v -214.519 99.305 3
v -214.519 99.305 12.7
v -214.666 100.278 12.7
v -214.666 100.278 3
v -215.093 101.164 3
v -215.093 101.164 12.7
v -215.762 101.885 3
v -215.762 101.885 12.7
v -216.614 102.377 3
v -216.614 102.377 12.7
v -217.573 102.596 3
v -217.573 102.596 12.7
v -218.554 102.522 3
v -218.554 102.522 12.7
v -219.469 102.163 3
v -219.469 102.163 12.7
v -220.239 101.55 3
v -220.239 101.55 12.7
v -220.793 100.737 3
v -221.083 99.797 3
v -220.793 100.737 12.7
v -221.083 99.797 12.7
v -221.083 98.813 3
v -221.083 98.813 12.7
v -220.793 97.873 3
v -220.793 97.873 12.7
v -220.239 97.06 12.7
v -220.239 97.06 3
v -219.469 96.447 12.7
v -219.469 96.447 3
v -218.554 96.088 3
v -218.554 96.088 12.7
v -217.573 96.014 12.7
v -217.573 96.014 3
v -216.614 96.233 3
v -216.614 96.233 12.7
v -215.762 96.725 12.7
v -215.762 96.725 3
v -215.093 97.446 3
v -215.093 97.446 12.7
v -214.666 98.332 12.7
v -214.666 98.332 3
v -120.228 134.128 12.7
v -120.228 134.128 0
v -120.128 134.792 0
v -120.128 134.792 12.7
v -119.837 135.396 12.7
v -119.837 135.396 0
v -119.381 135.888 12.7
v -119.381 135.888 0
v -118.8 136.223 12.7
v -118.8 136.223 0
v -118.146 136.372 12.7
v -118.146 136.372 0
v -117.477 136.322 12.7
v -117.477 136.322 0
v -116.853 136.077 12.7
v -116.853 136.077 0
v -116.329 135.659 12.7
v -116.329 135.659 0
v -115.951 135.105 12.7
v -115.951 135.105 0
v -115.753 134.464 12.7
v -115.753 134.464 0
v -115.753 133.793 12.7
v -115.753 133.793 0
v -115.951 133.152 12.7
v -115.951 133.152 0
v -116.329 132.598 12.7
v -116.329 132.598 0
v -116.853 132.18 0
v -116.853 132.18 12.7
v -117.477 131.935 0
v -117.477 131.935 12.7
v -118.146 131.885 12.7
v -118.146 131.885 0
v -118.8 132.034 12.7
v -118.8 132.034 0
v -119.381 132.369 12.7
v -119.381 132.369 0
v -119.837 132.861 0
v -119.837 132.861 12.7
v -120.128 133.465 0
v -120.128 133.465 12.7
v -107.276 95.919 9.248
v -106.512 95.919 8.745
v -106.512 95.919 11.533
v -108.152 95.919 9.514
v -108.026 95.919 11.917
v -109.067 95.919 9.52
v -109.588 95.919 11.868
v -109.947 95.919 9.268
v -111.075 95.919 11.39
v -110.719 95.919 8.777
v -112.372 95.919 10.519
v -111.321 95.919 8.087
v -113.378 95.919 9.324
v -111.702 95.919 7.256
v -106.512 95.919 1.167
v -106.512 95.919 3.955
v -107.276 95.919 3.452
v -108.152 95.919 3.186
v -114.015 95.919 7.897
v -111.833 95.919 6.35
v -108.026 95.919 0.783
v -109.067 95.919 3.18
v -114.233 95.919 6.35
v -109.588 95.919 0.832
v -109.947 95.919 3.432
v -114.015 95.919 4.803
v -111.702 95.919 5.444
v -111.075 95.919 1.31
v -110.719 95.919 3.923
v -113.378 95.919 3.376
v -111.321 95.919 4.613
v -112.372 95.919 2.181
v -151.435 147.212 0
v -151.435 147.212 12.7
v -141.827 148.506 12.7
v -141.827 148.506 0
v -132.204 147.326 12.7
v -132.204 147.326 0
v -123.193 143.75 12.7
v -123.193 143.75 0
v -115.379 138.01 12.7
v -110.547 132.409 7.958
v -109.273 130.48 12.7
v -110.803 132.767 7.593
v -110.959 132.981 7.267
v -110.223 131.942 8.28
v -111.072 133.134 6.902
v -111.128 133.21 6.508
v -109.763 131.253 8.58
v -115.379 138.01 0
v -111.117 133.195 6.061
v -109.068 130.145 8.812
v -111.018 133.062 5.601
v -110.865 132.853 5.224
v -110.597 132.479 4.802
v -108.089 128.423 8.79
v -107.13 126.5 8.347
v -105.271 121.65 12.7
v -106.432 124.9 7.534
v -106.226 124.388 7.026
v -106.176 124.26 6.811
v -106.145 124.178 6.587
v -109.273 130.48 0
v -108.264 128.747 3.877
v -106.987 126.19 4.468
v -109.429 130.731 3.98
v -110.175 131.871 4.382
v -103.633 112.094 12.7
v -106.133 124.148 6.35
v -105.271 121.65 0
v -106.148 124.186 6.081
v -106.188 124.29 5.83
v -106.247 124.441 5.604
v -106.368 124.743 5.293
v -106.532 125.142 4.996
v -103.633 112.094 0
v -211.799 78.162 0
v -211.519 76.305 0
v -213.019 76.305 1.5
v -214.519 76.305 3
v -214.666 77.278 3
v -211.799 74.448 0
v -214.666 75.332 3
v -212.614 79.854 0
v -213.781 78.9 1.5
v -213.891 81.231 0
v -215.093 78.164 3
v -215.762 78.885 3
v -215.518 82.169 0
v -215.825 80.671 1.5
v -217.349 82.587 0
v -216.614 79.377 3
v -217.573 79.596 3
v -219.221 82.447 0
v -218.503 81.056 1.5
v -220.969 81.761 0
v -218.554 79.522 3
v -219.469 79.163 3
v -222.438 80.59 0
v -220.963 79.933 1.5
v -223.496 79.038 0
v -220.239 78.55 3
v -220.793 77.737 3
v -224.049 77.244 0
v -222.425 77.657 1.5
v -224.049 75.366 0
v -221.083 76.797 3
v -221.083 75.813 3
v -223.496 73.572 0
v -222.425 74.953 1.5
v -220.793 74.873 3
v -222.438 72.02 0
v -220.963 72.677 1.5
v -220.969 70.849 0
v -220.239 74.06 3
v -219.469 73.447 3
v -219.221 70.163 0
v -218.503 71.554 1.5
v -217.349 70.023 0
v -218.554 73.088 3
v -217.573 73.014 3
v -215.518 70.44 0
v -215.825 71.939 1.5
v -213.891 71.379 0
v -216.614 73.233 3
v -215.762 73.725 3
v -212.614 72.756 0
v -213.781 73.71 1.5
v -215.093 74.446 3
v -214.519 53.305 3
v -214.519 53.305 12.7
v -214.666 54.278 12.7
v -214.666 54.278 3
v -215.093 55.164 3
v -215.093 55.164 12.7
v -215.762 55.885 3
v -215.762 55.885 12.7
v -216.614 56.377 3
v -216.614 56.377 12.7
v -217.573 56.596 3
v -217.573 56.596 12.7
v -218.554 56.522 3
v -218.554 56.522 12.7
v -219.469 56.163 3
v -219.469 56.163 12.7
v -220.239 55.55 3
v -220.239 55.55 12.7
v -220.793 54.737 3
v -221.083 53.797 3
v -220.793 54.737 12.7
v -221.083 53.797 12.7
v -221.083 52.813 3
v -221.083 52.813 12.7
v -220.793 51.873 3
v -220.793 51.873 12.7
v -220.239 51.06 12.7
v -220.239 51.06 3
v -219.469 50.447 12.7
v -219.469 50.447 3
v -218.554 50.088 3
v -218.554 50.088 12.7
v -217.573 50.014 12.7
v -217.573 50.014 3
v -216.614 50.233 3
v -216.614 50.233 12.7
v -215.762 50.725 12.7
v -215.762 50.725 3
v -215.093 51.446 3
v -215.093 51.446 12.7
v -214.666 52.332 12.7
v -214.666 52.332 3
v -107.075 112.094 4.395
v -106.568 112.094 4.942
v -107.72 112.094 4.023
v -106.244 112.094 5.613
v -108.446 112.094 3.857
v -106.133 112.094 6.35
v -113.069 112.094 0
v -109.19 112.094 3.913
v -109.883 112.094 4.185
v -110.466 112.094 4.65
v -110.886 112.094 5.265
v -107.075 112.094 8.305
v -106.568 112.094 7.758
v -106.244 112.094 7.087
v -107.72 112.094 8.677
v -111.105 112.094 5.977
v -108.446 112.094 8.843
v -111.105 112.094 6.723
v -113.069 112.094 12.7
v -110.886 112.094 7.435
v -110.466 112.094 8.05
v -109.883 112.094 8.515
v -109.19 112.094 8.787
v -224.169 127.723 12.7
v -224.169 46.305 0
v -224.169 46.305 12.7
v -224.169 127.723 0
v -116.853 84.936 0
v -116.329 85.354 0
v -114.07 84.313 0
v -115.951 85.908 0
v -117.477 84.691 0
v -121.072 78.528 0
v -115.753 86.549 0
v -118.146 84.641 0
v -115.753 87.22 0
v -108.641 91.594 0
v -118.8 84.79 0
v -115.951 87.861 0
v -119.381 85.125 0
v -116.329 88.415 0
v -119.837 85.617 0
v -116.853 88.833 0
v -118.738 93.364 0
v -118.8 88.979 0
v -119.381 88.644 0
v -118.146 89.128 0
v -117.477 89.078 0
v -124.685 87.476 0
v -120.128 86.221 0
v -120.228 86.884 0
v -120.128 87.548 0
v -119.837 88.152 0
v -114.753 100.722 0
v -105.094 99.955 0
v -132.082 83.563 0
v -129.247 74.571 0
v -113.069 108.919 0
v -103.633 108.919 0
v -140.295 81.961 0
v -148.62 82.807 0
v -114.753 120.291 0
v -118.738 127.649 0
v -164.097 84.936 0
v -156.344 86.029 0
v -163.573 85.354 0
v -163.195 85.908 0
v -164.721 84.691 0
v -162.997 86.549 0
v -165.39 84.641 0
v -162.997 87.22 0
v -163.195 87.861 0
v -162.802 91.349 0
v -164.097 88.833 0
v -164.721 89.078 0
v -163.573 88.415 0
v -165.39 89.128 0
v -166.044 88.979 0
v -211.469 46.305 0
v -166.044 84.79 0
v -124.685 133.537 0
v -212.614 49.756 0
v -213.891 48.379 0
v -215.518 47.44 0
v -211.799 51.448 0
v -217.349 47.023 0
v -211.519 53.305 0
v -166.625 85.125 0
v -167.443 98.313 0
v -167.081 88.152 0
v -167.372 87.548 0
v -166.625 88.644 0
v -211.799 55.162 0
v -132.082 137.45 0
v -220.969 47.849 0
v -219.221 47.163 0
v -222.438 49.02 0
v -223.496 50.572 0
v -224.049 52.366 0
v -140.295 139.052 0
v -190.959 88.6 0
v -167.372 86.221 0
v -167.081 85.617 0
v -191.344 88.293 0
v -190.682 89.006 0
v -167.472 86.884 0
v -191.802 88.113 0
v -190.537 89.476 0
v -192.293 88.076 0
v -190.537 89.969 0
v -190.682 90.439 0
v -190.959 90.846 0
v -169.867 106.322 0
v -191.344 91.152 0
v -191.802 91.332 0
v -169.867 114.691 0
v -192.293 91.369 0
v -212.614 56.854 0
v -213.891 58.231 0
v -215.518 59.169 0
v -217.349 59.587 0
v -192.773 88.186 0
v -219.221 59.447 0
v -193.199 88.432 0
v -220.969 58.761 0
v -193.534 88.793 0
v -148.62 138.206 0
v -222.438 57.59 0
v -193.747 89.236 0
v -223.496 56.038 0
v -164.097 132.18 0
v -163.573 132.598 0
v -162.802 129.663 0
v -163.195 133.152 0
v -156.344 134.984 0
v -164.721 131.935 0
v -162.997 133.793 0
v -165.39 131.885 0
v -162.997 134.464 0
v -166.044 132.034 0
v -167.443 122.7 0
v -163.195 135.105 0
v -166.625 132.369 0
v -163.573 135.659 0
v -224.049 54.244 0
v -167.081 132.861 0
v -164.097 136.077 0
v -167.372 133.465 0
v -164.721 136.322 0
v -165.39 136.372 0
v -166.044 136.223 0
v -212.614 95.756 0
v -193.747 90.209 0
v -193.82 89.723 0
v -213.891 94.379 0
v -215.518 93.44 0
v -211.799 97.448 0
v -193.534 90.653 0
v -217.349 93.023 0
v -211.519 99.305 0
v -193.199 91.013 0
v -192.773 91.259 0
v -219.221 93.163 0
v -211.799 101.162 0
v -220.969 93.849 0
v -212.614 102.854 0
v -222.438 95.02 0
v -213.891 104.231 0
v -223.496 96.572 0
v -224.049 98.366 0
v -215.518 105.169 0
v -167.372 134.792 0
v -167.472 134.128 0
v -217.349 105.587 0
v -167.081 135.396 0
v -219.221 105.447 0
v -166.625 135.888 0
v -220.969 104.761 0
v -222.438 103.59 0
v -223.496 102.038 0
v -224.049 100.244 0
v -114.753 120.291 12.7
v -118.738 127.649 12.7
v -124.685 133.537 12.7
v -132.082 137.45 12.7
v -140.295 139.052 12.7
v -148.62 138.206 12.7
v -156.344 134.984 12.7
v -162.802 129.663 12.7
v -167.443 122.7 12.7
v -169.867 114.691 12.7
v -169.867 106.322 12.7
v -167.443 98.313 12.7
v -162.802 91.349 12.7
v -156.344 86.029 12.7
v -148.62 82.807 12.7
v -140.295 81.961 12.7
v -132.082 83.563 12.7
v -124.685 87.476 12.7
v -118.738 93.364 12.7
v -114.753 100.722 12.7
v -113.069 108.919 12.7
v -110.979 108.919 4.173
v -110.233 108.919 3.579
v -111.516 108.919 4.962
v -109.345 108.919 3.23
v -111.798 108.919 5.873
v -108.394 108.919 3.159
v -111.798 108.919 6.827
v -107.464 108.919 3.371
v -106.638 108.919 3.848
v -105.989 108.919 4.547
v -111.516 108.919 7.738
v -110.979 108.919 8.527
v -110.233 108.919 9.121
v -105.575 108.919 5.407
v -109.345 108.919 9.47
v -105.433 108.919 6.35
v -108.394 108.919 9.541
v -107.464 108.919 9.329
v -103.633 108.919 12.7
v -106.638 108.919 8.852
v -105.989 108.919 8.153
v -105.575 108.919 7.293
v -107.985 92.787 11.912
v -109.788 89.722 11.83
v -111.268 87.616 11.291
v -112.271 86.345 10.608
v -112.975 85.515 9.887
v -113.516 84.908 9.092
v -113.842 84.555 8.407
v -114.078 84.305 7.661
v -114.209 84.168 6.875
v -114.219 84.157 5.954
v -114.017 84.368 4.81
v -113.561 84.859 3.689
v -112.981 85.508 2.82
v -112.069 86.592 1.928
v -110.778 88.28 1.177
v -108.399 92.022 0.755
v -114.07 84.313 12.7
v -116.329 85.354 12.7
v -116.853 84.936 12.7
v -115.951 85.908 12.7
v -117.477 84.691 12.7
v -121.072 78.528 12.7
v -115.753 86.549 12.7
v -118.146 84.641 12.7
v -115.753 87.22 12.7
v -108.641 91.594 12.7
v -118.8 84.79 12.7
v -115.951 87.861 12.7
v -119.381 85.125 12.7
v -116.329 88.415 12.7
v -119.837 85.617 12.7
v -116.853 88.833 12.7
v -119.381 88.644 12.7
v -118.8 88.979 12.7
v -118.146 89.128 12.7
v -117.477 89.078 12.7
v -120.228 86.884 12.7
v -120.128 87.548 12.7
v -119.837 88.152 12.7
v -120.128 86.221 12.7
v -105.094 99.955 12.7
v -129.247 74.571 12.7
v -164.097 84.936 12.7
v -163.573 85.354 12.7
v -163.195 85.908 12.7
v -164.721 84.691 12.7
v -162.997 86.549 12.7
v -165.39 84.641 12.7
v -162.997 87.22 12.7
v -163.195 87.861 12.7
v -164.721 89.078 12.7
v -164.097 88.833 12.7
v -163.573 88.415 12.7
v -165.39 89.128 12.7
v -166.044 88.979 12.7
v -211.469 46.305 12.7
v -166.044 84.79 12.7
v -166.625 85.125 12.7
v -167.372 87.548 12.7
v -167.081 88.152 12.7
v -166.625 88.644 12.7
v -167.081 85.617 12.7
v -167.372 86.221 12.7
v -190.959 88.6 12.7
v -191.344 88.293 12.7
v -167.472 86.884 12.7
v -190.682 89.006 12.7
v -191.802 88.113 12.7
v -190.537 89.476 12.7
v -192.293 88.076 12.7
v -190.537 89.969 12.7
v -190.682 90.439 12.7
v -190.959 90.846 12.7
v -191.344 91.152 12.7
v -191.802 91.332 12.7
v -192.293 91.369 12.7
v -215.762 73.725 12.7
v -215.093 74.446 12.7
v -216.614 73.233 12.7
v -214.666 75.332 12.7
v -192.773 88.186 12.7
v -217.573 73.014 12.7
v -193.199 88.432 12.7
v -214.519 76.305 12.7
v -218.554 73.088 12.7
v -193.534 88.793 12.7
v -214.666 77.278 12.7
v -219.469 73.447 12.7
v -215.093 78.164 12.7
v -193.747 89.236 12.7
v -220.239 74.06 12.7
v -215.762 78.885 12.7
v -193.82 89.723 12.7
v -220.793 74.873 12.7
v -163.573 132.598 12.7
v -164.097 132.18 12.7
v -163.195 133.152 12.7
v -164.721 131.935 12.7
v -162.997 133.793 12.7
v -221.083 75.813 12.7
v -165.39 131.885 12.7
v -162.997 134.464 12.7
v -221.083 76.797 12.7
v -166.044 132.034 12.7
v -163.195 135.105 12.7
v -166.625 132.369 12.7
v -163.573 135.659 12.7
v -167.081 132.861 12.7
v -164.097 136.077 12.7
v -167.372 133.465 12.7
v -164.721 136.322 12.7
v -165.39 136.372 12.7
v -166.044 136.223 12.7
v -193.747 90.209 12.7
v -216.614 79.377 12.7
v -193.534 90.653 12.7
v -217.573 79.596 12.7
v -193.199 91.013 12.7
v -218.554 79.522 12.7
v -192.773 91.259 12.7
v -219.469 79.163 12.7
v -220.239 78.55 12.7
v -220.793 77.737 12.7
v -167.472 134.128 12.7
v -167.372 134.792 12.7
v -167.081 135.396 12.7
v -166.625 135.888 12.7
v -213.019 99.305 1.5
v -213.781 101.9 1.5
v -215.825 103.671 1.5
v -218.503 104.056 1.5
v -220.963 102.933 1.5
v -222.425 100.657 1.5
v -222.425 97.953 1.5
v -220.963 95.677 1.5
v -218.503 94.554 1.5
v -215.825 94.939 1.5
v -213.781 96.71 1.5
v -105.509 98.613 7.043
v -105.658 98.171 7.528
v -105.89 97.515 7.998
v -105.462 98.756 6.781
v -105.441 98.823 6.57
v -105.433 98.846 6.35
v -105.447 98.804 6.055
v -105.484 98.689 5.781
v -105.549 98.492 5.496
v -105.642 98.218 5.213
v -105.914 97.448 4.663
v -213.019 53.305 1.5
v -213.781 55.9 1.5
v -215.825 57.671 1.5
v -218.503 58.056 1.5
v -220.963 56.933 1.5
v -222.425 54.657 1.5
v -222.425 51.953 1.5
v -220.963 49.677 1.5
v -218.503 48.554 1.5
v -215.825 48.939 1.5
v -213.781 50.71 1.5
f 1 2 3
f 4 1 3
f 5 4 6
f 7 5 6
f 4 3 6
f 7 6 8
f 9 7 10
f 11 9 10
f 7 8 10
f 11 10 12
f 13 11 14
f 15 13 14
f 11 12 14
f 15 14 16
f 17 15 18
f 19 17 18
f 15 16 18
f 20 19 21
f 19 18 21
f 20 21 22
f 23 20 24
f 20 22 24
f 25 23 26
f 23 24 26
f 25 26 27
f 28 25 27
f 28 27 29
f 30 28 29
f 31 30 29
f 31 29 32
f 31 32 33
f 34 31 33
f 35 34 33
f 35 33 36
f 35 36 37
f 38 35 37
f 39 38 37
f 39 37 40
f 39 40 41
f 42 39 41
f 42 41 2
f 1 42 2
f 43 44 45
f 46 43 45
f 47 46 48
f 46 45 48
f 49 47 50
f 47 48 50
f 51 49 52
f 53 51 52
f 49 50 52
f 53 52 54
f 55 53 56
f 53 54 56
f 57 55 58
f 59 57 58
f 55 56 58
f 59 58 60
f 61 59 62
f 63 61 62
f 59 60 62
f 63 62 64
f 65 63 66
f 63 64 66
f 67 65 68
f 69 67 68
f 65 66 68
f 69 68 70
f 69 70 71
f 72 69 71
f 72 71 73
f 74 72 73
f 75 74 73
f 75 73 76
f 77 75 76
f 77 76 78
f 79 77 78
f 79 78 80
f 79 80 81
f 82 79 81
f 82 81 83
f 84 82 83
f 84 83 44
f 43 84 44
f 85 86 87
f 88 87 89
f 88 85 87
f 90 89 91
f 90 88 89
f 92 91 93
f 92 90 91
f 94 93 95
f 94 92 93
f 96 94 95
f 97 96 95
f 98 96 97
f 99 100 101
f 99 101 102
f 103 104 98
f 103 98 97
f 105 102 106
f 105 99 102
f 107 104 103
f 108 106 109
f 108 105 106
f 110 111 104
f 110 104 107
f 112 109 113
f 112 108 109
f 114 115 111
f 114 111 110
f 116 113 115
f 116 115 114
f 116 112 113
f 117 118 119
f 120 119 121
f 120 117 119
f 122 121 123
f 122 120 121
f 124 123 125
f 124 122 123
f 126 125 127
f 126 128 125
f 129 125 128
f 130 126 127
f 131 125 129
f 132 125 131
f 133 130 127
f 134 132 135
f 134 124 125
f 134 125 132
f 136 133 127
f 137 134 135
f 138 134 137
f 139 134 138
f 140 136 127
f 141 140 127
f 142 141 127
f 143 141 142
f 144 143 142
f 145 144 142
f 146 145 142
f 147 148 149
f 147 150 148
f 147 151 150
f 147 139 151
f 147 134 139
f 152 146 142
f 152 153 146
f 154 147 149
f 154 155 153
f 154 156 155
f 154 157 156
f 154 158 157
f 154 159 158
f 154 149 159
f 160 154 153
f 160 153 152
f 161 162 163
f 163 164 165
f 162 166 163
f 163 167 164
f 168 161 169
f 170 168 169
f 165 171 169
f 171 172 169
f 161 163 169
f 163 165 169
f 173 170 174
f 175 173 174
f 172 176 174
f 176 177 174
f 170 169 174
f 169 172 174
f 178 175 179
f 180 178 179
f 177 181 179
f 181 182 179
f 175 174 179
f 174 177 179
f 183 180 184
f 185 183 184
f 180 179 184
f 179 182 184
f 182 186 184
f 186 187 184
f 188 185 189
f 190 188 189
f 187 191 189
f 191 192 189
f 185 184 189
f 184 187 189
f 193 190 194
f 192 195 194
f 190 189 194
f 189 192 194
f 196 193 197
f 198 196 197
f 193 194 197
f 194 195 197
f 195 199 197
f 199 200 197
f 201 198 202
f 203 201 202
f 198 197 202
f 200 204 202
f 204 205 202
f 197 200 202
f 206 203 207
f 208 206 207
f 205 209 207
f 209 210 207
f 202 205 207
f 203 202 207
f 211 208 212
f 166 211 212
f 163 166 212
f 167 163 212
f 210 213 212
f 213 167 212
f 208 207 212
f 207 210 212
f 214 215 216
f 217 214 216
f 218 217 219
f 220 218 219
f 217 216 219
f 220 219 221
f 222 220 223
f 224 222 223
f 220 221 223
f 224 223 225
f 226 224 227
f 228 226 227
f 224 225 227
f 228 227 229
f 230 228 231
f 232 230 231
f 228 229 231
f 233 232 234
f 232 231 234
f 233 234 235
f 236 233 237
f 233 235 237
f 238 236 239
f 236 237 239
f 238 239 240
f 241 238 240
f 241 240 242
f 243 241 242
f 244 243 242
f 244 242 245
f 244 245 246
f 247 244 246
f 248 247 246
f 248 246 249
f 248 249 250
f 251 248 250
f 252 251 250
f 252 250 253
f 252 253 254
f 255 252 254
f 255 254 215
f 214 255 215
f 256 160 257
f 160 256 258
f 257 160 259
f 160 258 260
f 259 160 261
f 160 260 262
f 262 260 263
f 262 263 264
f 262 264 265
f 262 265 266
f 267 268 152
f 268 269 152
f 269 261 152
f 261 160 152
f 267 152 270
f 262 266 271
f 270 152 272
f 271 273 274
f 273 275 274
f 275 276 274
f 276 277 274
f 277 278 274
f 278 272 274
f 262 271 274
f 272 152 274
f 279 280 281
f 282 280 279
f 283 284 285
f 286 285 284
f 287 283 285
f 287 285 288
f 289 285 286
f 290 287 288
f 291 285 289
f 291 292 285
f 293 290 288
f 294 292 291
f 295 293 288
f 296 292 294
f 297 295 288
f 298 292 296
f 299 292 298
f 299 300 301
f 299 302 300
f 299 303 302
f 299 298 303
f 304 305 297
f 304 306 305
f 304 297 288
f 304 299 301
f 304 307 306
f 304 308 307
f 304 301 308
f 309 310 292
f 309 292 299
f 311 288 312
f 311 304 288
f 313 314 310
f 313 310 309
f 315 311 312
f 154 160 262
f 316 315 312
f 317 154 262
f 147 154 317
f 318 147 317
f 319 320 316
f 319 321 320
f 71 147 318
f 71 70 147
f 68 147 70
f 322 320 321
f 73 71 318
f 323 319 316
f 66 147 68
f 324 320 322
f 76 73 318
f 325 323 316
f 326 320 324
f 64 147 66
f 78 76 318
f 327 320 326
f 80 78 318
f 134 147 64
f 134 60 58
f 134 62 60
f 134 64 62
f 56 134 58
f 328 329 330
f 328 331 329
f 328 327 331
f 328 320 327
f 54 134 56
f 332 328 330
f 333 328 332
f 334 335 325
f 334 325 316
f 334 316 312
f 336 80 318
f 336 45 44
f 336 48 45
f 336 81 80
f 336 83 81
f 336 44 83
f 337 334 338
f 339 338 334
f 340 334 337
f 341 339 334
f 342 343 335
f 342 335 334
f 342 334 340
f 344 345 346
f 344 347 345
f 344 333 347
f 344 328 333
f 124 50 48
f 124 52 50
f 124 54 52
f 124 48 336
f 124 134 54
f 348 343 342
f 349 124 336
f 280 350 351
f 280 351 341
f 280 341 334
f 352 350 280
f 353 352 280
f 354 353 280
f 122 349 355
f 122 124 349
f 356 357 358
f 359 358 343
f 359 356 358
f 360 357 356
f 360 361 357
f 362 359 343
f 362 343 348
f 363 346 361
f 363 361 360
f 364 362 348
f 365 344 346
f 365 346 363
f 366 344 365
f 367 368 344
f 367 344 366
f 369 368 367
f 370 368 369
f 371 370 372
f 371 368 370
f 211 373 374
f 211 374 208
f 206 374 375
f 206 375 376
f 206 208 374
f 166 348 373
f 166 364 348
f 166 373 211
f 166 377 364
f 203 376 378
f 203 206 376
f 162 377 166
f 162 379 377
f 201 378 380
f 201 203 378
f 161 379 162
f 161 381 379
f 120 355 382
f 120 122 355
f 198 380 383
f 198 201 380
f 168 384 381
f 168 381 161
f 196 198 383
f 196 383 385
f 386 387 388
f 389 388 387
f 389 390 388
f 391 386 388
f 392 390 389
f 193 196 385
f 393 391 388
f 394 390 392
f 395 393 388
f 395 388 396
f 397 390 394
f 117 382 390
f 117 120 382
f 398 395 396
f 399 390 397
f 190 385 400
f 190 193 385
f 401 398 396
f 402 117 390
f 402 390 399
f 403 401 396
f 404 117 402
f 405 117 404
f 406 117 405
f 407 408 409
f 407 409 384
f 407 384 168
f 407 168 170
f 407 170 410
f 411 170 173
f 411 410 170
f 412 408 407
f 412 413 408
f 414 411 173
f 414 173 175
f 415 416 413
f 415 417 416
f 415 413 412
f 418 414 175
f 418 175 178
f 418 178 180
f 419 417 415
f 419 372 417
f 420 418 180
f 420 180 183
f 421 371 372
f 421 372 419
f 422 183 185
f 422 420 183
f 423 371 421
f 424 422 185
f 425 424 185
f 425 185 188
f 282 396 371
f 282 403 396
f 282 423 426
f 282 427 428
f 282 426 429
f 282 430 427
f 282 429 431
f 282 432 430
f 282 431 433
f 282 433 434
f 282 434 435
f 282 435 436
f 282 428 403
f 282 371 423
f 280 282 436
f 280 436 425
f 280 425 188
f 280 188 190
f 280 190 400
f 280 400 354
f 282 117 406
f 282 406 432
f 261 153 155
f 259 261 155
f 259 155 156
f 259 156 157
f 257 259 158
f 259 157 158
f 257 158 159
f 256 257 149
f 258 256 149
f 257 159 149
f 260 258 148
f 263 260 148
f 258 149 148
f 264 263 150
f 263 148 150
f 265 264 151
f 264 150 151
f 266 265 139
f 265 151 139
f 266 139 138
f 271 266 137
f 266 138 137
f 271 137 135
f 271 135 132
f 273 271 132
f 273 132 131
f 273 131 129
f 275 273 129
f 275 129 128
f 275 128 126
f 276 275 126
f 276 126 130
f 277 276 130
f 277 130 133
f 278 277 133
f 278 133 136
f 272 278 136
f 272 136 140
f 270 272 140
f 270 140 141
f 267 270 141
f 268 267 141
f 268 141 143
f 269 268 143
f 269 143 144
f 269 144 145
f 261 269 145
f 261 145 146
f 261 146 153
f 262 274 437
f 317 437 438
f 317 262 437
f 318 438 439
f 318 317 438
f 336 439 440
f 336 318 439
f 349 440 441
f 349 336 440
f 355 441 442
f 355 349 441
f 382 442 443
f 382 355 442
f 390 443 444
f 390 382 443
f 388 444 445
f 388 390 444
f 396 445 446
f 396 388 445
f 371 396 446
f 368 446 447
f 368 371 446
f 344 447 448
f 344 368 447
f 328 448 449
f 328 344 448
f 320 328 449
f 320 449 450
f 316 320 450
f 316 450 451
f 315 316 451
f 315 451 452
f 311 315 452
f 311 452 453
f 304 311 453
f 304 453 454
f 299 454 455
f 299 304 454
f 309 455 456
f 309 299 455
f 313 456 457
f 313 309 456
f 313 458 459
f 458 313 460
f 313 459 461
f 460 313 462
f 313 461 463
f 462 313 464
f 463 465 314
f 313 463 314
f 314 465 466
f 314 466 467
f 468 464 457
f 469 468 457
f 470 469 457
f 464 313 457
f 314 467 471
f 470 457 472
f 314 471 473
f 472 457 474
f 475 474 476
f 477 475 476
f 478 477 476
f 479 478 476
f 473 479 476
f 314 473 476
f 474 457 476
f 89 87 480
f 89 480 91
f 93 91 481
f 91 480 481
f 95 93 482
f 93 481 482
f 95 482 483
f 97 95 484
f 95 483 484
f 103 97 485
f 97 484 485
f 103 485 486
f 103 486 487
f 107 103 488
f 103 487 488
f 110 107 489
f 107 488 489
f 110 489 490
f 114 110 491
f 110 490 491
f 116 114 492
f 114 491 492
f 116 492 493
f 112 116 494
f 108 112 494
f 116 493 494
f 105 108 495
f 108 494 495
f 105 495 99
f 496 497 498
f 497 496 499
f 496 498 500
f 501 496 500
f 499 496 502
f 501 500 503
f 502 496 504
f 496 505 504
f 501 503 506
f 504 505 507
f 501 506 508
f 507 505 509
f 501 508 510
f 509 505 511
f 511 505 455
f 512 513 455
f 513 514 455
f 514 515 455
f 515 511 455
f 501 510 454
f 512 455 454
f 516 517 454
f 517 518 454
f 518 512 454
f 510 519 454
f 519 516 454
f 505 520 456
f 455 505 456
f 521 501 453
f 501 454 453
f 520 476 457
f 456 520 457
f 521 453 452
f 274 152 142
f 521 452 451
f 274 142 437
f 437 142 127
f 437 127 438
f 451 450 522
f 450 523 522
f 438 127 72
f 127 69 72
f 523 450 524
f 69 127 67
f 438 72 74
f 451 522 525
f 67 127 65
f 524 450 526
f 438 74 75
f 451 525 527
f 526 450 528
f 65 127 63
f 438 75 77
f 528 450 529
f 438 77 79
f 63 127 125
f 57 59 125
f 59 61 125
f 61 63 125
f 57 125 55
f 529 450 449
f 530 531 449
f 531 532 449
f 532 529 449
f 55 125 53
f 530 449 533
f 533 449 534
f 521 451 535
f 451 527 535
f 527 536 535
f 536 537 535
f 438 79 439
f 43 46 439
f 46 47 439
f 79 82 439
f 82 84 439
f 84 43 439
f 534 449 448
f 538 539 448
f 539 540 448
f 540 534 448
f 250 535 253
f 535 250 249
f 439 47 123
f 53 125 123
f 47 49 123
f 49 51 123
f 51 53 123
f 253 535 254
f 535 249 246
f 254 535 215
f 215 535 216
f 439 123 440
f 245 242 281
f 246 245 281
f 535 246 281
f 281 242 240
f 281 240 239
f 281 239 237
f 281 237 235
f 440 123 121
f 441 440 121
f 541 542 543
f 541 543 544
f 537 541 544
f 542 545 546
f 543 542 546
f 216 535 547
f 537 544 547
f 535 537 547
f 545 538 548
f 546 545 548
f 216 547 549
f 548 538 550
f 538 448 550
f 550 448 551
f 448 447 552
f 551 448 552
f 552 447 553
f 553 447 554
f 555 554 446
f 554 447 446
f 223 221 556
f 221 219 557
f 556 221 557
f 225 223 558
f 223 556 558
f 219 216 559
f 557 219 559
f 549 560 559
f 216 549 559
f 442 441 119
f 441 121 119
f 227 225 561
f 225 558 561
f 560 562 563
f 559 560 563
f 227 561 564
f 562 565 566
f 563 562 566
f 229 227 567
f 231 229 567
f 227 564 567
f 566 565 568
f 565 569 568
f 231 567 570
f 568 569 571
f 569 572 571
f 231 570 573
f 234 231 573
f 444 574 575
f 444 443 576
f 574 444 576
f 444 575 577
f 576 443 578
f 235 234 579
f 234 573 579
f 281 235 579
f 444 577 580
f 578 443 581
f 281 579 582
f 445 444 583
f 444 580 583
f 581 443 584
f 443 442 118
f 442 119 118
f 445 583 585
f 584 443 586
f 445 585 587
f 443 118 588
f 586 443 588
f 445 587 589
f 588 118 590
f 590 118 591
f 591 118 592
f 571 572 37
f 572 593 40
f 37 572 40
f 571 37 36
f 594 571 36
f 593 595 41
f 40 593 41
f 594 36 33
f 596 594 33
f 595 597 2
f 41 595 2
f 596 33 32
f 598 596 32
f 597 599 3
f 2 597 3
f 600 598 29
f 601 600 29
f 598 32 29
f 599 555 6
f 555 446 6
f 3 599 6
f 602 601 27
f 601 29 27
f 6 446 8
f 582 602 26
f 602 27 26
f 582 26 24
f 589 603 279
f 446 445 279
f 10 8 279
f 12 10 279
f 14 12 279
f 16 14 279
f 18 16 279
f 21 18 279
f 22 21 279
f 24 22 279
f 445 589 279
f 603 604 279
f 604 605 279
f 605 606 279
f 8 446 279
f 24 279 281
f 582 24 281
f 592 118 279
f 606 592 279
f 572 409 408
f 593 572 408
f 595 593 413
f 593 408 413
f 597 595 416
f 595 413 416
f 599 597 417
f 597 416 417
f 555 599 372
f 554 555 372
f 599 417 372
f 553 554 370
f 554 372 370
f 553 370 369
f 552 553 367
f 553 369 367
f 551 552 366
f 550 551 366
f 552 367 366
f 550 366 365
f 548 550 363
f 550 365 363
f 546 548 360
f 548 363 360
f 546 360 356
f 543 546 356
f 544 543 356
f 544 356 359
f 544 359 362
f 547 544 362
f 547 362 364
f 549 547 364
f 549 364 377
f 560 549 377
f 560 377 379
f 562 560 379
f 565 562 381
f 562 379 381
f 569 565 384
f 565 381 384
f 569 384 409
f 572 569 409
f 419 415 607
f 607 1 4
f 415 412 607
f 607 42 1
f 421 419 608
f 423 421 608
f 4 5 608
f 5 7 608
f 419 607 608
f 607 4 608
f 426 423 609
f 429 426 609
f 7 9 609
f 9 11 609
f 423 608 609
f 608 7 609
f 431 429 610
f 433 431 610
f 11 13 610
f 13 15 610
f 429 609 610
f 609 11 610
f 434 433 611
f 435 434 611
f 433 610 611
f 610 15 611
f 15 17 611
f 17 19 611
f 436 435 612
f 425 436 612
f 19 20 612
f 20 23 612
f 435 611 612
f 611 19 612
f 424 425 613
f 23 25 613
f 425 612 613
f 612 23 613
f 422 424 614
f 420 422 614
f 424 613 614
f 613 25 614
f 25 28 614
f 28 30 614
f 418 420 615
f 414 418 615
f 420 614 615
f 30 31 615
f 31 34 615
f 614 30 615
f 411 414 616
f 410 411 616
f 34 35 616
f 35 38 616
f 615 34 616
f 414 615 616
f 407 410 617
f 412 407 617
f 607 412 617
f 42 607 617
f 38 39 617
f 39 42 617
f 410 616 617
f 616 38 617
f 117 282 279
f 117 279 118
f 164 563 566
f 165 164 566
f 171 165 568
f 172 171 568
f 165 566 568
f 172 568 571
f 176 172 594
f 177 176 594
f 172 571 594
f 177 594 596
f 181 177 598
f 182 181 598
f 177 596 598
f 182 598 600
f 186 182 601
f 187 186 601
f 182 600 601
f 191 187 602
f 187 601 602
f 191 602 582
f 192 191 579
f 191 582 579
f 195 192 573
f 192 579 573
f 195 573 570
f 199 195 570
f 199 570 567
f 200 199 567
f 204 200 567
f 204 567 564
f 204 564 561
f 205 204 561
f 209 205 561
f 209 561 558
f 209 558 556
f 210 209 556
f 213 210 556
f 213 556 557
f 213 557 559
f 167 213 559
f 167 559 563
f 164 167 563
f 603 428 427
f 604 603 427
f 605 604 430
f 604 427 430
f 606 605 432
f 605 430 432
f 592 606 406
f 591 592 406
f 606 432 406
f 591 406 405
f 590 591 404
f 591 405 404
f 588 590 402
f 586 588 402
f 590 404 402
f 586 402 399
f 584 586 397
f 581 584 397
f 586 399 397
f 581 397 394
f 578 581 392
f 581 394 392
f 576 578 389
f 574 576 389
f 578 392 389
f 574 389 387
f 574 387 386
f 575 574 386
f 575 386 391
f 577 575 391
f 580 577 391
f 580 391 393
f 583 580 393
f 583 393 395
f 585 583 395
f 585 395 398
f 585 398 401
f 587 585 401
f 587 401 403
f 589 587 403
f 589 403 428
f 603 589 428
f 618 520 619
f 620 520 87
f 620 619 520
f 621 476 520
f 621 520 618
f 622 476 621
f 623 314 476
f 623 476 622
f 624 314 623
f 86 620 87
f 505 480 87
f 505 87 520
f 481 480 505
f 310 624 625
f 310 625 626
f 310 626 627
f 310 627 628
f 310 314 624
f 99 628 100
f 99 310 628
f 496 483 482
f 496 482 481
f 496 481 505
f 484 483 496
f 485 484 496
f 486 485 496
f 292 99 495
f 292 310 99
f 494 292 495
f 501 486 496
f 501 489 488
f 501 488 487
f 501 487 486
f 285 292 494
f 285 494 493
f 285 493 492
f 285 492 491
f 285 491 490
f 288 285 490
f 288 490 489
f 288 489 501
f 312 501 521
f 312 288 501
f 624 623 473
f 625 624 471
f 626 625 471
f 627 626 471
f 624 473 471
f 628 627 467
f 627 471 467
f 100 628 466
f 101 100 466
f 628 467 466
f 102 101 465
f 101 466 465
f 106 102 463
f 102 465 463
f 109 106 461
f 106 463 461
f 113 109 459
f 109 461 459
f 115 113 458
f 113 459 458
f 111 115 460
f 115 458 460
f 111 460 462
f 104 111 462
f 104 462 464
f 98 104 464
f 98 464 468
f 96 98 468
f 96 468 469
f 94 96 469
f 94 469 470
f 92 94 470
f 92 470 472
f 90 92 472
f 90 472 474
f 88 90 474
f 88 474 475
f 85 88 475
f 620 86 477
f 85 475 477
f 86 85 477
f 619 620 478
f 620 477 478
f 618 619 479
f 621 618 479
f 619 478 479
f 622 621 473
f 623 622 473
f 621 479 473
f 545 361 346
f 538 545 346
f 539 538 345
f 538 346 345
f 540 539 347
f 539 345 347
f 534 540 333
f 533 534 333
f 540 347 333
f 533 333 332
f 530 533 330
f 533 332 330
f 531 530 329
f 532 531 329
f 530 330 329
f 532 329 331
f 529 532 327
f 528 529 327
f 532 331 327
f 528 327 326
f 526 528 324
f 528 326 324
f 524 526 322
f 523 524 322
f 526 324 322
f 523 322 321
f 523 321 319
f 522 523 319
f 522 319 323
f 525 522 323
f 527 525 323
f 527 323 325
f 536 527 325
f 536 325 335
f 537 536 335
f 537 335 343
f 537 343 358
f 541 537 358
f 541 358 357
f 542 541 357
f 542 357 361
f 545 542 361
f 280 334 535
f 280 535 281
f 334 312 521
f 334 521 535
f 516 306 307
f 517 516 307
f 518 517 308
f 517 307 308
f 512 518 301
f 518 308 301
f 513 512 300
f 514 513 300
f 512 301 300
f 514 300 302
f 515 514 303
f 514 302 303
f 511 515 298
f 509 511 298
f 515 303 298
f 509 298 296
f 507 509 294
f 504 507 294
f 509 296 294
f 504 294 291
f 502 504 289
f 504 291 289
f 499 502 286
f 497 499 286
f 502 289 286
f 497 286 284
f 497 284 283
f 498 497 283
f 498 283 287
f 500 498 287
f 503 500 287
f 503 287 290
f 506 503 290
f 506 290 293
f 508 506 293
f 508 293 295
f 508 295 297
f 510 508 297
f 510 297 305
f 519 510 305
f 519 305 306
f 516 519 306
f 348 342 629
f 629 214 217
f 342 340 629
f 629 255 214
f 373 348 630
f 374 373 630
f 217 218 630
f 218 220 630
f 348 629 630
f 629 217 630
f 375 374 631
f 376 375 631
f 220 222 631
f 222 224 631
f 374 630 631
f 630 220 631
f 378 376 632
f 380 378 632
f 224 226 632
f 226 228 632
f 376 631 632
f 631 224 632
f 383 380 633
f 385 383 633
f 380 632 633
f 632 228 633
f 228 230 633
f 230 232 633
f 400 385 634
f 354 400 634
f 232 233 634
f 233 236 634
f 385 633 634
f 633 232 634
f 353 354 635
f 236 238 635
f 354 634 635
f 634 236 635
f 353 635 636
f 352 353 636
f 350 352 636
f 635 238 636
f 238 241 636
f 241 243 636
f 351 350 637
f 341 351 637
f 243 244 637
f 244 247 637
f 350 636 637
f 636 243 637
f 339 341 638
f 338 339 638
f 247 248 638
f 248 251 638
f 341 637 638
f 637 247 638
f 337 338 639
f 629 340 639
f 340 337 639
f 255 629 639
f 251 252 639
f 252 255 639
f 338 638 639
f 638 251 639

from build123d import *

# Parameters (mm, degrees)
BOSS_EXTRUDE1_DEPTH         = 12.7
CUT_EXTRUDE1_DEPTH          = 13.7
SKETCH3_W                   = 28.575
SKETCH3_H                   = 12.7
F_8_CLEARANCE_HOLE1_D       = 4.5
F_8_CLEARANCE_HOLE1_DEPTH   = 12.7
F_1_4_CLEARANCE_HOLE1_D     = 6.6
F_1_4_CLEARANCE_HOLE1_DEPTH = 12.7
F_12_CLEARANCE_HOLE1_D      = 6
F_12_CLEARANCE_HOLE1_DEPTH  = 12.7
HOLE1_D                     = 6.4
HOLE1_DEPTH                 = 24.77643101
HOLE1_CBORE_D               = 11.2
HOLE1_CBORE_DEPTH           = 11.77643101
F_10_CLEARANCE_HOLE1_D      = 5
F_10_CLEARANCE_HOLE1_DEPTH  = 36.4125
CHAMFER1_SIZE               = 3
SKETCH14_R                  = 3
SKETCH14_R_2                = 1.651
BOSS_EXTRUDE2_DEPTH         = 12.7


with BuildPart() as part:
    # Sketch1 → Boss-Extrude1 (new body)
    with BuildSketch(Plane(origin=(0, 0, 0), x_dir=(-1, 0, 0), z_dir=(0, 0, -1))):
        with BuildLine():
            Line((224.169455465, 127.72254562), (151.435240745, 147.211619716))
            ThreePointArc((151.435240745, 147.211619716), (105.257753851, 121.607458019), (129.246532787, 74.570537656))
            Line((129.246532787, 74.570537656), (211.469455465, 46.304993078))
            Line((211.469455465, 46.304993078), (224.169455465, 46.304993078))
            Line((224.169455465, 46.304993078), (224.169455465, 127.72254562))
        make_face()
    extrude(amount=-BOSS_EXTRUDE1_DEPTH)

    # Sketch2 → Cut-Extrude1 (cut, through all)
    with BuildSketch(Plane.XY.offset(12.7)):
        with BuildLine():
            Line((-103.633291463, 112.093938317), (-113.179018515, 112.093938317))
            ThreePointArc((-113.179018515, 112.093938317), (-113.134717032, 110.506438317), (-113.179018515, 108.918938317))
            Line((-113.179018515, 108.918938317), (-103.633291463, 108.918938317))
            ThreePointArc((-103.633291463, 108.918938317), (-103.600117032, 110.506438317), (-103.633291463, 112.093938317))
        make_face()
    extrude(amount=-CUT_EXTRUDE1_DEPTH, mode=Mode.SUBTRACT)

    # Sketch3 → Cut-Revolve1 (revolve, cut)
    with BuildSketch(Plane(origin=(0, 110.506438317, 0), x_dir=(1, 0, 0), z_dir=(0, 1, 0))):
        with Locations((-127.312617032, -6.35)):
            Rectangle(SKETCH3_W, SKETCH3_H)
    revolve(axis=Axis((-141.600117032, 110.506438317, 0), (0, 0, 1)), mode=Mode.SUBTRACT)

    # #8 Clearance Hole1
    with Locations(Plane.XY.offset(12.7)):
        with Locations((-117.978117032, 86.884438317), (-165.222117032, 86.884438317), (-165.222117032, 134.128438317), (-117.978117032, 134.128438317)):
            Hole(F_8_CLEARANCE_HOLE1_D / 2, depth=F_8_CLEARANCE_HOLE1_DEPTH)

    # 1/4 Clearance Hole1
    with Locations(Plane(origin=(0, 0, 0), x_dir=(-1, 0, 0), z_dir=(0, 0, -1))):
        with Locations((217.819455465, 53.304993078), (217.819455465, 76.304993078), (217.819455465, 99.304993078)):
            Hole(F_1_4_CLEARANCE_HOLE1_D / 2, depth=F_1_4_CLEARANCE_HOLE1_DEPTH)

    # #12 Clearance Hole1
    with Locations(Plane.XY.offset(12.7)):
        with Locations((-192.169455465, 89.72254562)):
            Hole(F_12_CLEARANCE_HOLE1_D / 2, depth=F_12_CLEARANCE_HOLE1_DEPTH)

    # Hole1
    with Locations(Plane(origin=(0, 84.142507307, 0), x_dir=(-1, 0, 0), z_dir=(0, -1, 0))):
        with Locations((108.633291463, -6.35)):
            CounterBoreHole(HOLE1_D / 2, HOLE1_CBORE_D / 2, HOLE1_CBORE_DEPTH, depth=HOLE1_DEPTH)

    # #10 Clearance Hole1
    with Locations(Plane(origin=(0, 112.093938317, 0), x_dir=(-1, 0, 0), z_dir=(0, -1, 0))):
        with Locations((108.633291463, -6.35)):
            Hole(F_10_CLEARANCE_HOLE1_D / 2, depth=F_10_CLEARANCE_HOLE1_DEPTH)

    # Chamfer1
    chamfer1_edges = [part.edges().sort_by_distance(p)[0] for p in [
        (-221.119455465, 99.304993078, 0),
        (-221.119455465, 76.304993078, 0),
        (-221.119455465, 53.304993078, 0),
    ]]
    chamfer(chamfer1_edges, length=CHAMFER1_SIZE)

    # Sketch14 → Boss-Extrude2 (add)
    with BuildSketch(Plane(origin=(0, 0, 0), x_dir=(-1, 0, 0), z_dir=(0, 0, -1))):
        with Locations((192.169455465, 89.72254562)):
            Circle(SKETCH14_R)
        with Locations((192.169455465, 89.72254562)):
            Circle(SKETCH14_R_2, mode=Mode.SUBTRACT)
    extrude(amount=-BOSS_EXTRUDE2_DEPTH)


solid = part.part
